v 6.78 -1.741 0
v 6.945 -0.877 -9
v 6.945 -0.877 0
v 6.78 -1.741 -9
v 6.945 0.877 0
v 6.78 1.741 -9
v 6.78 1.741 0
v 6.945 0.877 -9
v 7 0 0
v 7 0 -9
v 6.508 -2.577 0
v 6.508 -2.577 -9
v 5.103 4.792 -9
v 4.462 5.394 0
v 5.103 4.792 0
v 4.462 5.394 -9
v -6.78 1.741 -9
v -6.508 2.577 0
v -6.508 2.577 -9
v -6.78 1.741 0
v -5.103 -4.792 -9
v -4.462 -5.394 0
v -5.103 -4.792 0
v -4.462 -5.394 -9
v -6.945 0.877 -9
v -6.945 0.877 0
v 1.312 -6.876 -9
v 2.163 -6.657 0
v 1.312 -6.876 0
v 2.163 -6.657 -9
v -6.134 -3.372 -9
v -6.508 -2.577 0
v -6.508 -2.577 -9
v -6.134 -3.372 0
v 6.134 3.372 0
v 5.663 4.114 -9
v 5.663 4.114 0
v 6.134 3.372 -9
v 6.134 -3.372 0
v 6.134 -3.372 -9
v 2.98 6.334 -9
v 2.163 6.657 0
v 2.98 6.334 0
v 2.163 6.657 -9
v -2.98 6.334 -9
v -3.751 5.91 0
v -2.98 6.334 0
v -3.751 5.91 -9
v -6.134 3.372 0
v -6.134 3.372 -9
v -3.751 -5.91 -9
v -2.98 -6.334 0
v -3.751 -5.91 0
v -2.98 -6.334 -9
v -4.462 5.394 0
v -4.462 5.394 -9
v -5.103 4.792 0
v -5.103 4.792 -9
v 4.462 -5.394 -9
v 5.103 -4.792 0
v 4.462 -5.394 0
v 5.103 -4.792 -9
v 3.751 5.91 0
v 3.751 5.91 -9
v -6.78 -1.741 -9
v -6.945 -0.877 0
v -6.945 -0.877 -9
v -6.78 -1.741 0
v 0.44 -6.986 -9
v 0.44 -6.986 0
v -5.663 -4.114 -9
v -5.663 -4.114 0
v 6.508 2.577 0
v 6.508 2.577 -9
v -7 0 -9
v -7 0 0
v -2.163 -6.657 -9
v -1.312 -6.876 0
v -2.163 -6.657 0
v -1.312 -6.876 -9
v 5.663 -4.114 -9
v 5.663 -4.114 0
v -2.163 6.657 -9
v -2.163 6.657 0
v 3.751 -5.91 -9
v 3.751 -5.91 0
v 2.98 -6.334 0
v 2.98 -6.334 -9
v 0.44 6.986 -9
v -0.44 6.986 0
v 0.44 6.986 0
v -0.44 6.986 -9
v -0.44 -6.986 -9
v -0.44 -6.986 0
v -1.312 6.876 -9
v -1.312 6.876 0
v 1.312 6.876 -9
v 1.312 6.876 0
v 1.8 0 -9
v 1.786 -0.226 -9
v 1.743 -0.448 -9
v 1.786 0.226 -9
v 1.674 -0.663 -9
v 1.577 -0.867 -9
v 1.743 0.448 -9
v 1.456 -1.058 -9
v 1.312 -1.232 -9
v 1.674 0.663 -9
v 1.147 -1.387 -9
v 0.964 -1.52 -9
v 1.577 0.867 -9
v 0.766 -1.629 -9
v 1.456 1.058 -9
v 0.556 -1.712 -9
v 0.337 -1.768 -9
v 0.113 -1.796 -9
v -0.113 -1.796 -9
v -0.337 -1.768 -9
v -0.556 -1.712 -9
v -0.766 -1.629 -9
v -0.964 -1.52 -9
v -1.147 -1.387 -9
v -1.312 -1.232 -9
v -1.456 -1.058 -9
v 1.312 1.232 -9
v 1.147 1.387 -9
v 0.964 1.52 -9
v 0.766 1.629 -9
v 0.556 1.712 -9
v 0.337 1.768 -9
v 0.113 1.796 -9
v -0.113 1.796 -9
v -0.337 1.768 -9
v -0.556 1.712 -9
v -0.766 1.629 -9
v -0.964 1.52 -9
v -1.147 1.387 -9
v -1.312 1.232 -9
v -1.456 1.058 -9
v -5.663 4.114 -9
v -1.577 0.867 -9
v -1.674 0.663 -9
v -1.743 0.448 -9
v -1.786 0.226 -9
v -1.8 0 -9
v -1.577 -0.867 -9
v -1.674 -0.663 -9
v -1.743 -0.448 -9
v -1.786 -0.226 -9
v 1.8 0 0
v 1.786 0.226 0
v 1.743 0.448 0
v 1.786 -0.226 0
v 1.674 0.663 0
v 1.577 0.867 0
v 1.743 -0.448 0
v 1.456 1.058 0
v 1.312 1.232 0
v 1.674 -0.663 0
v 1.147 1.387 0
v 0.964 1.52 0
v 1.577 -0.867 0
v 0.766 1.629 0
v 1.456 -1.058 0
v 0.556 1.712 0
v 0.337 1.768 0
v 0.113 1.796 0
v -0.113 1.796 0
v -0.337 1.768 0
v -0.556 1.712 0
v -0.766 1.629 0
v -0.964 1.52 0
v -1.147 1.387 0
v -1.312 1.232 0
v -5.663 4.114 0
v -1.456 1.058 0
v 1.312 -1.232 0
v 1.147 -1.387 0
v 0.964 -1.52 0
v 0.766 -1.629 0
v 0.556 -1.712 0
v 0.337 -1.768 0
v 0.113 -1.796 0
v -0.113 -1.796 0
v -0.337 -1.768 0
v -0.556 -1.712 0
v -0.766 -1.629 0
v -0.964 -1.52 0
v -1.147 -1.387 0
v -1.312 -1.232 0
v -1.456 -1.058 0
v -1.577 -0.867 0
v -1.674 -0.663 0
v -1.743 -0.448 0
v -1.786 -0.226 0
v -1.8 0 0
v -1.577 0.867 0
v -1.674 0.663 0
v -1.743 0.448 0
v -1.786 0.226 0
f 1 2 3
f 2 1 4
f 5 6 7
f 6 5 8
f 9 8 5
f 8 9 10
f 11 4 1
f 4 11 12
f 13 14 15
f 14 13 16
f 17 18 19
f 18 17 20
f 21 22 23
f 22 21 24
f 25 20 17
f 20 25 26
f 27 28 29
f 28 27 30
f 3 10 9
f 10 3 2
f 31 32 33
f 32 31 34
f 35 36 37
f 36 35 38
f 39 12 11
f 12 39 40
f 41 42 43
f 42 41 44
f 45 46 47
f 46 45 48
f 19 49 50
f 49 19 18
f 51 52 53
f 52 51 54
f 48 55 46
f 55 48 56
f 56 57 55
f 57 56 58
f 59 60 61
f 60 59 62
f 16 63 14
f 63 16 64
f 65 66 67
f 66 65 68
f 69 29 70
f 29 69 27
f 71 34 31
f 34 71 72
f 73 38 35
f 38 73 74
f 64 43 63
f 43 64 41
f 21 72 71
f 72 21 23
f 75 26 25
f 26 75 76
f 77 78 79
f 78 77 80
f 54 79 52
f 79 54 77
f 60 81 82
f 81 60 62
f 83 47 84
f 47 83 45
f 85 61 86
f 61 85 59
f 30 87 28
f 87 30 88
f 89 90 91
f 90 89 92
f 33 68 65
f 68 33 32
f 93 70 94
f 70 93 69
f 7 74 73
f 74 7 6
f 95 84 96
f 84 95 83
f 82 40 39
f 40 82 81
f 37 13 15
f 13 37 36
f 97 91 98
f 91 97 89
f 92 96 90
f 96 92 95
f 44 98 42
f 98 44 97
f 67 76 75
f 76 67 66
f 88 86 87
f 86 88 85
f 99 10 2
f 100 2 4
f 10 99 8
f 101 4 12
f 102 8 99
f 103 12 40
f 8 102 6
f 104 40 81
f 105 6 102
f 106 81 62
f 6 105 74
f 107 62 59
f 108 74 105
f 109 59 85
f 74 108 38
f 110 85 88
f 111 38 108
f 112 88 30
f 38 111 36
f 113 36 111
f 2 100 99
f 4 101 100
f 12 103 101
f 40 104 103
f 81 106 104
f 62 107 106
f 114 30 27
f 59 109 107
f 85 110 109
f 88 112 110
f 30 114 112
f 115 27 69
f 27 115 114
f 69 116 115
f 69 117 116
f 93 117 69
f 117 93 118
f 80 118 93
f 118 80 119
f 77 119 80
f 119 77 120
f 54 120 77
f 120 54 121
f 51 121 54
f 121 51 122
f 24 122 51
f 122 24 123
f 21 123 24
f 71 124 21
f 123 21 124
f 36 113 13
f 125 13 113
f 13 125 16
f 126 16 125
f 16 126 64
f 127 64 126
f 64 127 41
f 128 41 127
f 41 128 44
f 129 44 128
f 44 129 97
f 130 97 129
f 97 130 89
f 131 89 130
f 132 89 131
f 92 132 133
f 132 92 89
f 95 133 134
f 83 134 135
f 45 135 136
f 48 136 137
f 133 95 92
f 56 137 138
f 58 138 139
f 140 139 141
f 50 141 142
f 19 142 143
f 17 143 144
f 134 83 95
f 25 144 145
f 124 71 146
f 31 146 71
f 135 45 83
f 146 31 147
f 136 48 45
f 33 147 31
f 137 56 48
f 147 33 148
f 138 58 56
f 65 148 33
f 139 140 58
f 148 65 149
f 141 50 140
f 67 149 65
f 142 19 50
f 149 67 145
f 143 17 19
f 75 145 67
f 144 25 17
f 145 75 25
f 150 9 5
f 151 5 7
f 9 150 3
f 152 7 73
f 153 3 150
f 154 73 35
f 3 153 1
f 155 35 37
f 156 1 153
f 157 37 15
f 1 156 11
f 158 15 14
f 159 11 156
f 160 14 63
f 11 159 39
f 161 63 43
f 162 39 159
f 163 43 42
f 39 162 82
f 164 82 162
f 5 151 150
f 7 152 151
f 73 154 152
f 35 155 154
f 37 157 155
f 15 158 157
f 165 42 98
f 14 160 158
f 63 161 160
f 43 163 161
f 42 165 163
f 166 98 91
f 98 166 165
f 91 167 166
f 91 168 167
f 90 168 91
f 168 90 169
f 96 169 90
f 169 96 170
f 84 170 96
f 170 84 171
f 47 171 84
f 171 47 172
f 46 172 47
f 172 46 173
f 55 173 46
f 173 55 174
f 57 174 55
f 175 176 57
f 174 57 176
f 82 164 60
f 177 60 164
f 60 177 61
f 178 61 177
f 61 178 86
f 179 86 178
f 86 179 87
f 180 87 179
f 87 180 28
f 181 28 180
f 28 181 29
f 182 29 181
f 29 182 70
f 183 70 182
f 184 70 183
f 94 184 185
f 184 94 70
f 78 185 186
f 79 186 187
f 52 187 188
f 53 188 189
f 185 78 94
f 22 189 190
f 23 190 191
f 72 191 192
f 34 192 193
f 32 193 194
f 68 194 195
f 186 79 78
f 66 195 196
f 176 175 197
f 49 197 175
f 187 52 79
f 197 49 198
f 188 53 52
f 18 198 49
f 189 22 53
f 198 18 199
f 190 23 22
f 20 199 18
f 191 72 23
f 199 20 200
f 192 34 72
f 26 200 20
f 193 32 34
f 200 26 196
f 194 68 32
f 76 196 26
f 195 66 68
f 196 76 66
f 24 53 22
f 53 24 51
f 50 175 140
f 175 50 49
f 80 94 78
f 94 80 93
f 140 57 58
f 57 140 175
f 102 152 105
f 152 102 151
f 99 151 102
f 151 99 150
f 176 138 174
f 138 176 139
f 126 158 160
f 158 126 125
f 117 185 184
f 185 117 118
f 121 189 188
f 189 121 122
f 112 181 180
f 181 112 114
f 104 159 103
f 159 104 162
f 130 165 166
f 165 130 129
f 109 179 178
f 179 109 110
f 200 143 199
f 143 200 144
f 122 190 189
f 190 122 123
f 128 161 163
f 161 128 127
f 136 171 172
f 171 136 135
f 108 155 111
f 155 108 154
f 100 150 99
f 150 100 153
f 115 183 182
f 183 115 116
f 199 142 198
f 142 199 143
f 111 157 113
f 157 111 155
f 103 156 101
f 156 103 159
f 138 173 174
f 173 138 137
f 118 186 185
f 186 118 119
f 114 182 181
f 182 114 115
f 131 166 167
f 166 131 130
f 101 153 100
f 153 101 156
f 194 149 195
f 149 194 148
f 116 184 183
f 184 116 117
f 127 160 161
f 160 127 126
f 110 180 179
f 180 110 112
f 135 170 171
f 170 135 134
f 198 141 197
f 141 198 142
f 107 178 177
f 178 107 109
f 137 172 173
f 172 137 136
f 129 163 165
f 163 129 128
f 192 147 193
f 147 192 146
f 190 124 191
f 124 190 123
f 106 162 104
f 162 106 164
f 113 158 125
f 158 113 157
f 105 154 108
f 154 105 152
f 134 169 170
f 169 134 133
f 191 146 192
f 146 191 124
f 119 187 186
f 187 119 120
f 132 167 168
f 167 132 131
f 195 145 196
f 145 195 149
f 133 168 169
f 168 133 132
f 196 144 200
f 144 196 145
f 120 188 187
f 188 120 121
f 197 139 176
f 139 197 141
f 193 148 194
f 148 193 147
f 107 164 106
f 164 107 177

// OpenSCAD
$fn = 50;


difference() {
	union() {
		translate(v = [0, 0, -9.0000000000]) {
			cylinder(h = 9, r = 7.0000000000);
		}
		cylinder(h = 0, r = 17.0000000000);
	}
	union() {
		#translate(v = [0, 0, -9]) {
			cylinder(h = 9, r = 1.8000000000);
		}
	}
}
